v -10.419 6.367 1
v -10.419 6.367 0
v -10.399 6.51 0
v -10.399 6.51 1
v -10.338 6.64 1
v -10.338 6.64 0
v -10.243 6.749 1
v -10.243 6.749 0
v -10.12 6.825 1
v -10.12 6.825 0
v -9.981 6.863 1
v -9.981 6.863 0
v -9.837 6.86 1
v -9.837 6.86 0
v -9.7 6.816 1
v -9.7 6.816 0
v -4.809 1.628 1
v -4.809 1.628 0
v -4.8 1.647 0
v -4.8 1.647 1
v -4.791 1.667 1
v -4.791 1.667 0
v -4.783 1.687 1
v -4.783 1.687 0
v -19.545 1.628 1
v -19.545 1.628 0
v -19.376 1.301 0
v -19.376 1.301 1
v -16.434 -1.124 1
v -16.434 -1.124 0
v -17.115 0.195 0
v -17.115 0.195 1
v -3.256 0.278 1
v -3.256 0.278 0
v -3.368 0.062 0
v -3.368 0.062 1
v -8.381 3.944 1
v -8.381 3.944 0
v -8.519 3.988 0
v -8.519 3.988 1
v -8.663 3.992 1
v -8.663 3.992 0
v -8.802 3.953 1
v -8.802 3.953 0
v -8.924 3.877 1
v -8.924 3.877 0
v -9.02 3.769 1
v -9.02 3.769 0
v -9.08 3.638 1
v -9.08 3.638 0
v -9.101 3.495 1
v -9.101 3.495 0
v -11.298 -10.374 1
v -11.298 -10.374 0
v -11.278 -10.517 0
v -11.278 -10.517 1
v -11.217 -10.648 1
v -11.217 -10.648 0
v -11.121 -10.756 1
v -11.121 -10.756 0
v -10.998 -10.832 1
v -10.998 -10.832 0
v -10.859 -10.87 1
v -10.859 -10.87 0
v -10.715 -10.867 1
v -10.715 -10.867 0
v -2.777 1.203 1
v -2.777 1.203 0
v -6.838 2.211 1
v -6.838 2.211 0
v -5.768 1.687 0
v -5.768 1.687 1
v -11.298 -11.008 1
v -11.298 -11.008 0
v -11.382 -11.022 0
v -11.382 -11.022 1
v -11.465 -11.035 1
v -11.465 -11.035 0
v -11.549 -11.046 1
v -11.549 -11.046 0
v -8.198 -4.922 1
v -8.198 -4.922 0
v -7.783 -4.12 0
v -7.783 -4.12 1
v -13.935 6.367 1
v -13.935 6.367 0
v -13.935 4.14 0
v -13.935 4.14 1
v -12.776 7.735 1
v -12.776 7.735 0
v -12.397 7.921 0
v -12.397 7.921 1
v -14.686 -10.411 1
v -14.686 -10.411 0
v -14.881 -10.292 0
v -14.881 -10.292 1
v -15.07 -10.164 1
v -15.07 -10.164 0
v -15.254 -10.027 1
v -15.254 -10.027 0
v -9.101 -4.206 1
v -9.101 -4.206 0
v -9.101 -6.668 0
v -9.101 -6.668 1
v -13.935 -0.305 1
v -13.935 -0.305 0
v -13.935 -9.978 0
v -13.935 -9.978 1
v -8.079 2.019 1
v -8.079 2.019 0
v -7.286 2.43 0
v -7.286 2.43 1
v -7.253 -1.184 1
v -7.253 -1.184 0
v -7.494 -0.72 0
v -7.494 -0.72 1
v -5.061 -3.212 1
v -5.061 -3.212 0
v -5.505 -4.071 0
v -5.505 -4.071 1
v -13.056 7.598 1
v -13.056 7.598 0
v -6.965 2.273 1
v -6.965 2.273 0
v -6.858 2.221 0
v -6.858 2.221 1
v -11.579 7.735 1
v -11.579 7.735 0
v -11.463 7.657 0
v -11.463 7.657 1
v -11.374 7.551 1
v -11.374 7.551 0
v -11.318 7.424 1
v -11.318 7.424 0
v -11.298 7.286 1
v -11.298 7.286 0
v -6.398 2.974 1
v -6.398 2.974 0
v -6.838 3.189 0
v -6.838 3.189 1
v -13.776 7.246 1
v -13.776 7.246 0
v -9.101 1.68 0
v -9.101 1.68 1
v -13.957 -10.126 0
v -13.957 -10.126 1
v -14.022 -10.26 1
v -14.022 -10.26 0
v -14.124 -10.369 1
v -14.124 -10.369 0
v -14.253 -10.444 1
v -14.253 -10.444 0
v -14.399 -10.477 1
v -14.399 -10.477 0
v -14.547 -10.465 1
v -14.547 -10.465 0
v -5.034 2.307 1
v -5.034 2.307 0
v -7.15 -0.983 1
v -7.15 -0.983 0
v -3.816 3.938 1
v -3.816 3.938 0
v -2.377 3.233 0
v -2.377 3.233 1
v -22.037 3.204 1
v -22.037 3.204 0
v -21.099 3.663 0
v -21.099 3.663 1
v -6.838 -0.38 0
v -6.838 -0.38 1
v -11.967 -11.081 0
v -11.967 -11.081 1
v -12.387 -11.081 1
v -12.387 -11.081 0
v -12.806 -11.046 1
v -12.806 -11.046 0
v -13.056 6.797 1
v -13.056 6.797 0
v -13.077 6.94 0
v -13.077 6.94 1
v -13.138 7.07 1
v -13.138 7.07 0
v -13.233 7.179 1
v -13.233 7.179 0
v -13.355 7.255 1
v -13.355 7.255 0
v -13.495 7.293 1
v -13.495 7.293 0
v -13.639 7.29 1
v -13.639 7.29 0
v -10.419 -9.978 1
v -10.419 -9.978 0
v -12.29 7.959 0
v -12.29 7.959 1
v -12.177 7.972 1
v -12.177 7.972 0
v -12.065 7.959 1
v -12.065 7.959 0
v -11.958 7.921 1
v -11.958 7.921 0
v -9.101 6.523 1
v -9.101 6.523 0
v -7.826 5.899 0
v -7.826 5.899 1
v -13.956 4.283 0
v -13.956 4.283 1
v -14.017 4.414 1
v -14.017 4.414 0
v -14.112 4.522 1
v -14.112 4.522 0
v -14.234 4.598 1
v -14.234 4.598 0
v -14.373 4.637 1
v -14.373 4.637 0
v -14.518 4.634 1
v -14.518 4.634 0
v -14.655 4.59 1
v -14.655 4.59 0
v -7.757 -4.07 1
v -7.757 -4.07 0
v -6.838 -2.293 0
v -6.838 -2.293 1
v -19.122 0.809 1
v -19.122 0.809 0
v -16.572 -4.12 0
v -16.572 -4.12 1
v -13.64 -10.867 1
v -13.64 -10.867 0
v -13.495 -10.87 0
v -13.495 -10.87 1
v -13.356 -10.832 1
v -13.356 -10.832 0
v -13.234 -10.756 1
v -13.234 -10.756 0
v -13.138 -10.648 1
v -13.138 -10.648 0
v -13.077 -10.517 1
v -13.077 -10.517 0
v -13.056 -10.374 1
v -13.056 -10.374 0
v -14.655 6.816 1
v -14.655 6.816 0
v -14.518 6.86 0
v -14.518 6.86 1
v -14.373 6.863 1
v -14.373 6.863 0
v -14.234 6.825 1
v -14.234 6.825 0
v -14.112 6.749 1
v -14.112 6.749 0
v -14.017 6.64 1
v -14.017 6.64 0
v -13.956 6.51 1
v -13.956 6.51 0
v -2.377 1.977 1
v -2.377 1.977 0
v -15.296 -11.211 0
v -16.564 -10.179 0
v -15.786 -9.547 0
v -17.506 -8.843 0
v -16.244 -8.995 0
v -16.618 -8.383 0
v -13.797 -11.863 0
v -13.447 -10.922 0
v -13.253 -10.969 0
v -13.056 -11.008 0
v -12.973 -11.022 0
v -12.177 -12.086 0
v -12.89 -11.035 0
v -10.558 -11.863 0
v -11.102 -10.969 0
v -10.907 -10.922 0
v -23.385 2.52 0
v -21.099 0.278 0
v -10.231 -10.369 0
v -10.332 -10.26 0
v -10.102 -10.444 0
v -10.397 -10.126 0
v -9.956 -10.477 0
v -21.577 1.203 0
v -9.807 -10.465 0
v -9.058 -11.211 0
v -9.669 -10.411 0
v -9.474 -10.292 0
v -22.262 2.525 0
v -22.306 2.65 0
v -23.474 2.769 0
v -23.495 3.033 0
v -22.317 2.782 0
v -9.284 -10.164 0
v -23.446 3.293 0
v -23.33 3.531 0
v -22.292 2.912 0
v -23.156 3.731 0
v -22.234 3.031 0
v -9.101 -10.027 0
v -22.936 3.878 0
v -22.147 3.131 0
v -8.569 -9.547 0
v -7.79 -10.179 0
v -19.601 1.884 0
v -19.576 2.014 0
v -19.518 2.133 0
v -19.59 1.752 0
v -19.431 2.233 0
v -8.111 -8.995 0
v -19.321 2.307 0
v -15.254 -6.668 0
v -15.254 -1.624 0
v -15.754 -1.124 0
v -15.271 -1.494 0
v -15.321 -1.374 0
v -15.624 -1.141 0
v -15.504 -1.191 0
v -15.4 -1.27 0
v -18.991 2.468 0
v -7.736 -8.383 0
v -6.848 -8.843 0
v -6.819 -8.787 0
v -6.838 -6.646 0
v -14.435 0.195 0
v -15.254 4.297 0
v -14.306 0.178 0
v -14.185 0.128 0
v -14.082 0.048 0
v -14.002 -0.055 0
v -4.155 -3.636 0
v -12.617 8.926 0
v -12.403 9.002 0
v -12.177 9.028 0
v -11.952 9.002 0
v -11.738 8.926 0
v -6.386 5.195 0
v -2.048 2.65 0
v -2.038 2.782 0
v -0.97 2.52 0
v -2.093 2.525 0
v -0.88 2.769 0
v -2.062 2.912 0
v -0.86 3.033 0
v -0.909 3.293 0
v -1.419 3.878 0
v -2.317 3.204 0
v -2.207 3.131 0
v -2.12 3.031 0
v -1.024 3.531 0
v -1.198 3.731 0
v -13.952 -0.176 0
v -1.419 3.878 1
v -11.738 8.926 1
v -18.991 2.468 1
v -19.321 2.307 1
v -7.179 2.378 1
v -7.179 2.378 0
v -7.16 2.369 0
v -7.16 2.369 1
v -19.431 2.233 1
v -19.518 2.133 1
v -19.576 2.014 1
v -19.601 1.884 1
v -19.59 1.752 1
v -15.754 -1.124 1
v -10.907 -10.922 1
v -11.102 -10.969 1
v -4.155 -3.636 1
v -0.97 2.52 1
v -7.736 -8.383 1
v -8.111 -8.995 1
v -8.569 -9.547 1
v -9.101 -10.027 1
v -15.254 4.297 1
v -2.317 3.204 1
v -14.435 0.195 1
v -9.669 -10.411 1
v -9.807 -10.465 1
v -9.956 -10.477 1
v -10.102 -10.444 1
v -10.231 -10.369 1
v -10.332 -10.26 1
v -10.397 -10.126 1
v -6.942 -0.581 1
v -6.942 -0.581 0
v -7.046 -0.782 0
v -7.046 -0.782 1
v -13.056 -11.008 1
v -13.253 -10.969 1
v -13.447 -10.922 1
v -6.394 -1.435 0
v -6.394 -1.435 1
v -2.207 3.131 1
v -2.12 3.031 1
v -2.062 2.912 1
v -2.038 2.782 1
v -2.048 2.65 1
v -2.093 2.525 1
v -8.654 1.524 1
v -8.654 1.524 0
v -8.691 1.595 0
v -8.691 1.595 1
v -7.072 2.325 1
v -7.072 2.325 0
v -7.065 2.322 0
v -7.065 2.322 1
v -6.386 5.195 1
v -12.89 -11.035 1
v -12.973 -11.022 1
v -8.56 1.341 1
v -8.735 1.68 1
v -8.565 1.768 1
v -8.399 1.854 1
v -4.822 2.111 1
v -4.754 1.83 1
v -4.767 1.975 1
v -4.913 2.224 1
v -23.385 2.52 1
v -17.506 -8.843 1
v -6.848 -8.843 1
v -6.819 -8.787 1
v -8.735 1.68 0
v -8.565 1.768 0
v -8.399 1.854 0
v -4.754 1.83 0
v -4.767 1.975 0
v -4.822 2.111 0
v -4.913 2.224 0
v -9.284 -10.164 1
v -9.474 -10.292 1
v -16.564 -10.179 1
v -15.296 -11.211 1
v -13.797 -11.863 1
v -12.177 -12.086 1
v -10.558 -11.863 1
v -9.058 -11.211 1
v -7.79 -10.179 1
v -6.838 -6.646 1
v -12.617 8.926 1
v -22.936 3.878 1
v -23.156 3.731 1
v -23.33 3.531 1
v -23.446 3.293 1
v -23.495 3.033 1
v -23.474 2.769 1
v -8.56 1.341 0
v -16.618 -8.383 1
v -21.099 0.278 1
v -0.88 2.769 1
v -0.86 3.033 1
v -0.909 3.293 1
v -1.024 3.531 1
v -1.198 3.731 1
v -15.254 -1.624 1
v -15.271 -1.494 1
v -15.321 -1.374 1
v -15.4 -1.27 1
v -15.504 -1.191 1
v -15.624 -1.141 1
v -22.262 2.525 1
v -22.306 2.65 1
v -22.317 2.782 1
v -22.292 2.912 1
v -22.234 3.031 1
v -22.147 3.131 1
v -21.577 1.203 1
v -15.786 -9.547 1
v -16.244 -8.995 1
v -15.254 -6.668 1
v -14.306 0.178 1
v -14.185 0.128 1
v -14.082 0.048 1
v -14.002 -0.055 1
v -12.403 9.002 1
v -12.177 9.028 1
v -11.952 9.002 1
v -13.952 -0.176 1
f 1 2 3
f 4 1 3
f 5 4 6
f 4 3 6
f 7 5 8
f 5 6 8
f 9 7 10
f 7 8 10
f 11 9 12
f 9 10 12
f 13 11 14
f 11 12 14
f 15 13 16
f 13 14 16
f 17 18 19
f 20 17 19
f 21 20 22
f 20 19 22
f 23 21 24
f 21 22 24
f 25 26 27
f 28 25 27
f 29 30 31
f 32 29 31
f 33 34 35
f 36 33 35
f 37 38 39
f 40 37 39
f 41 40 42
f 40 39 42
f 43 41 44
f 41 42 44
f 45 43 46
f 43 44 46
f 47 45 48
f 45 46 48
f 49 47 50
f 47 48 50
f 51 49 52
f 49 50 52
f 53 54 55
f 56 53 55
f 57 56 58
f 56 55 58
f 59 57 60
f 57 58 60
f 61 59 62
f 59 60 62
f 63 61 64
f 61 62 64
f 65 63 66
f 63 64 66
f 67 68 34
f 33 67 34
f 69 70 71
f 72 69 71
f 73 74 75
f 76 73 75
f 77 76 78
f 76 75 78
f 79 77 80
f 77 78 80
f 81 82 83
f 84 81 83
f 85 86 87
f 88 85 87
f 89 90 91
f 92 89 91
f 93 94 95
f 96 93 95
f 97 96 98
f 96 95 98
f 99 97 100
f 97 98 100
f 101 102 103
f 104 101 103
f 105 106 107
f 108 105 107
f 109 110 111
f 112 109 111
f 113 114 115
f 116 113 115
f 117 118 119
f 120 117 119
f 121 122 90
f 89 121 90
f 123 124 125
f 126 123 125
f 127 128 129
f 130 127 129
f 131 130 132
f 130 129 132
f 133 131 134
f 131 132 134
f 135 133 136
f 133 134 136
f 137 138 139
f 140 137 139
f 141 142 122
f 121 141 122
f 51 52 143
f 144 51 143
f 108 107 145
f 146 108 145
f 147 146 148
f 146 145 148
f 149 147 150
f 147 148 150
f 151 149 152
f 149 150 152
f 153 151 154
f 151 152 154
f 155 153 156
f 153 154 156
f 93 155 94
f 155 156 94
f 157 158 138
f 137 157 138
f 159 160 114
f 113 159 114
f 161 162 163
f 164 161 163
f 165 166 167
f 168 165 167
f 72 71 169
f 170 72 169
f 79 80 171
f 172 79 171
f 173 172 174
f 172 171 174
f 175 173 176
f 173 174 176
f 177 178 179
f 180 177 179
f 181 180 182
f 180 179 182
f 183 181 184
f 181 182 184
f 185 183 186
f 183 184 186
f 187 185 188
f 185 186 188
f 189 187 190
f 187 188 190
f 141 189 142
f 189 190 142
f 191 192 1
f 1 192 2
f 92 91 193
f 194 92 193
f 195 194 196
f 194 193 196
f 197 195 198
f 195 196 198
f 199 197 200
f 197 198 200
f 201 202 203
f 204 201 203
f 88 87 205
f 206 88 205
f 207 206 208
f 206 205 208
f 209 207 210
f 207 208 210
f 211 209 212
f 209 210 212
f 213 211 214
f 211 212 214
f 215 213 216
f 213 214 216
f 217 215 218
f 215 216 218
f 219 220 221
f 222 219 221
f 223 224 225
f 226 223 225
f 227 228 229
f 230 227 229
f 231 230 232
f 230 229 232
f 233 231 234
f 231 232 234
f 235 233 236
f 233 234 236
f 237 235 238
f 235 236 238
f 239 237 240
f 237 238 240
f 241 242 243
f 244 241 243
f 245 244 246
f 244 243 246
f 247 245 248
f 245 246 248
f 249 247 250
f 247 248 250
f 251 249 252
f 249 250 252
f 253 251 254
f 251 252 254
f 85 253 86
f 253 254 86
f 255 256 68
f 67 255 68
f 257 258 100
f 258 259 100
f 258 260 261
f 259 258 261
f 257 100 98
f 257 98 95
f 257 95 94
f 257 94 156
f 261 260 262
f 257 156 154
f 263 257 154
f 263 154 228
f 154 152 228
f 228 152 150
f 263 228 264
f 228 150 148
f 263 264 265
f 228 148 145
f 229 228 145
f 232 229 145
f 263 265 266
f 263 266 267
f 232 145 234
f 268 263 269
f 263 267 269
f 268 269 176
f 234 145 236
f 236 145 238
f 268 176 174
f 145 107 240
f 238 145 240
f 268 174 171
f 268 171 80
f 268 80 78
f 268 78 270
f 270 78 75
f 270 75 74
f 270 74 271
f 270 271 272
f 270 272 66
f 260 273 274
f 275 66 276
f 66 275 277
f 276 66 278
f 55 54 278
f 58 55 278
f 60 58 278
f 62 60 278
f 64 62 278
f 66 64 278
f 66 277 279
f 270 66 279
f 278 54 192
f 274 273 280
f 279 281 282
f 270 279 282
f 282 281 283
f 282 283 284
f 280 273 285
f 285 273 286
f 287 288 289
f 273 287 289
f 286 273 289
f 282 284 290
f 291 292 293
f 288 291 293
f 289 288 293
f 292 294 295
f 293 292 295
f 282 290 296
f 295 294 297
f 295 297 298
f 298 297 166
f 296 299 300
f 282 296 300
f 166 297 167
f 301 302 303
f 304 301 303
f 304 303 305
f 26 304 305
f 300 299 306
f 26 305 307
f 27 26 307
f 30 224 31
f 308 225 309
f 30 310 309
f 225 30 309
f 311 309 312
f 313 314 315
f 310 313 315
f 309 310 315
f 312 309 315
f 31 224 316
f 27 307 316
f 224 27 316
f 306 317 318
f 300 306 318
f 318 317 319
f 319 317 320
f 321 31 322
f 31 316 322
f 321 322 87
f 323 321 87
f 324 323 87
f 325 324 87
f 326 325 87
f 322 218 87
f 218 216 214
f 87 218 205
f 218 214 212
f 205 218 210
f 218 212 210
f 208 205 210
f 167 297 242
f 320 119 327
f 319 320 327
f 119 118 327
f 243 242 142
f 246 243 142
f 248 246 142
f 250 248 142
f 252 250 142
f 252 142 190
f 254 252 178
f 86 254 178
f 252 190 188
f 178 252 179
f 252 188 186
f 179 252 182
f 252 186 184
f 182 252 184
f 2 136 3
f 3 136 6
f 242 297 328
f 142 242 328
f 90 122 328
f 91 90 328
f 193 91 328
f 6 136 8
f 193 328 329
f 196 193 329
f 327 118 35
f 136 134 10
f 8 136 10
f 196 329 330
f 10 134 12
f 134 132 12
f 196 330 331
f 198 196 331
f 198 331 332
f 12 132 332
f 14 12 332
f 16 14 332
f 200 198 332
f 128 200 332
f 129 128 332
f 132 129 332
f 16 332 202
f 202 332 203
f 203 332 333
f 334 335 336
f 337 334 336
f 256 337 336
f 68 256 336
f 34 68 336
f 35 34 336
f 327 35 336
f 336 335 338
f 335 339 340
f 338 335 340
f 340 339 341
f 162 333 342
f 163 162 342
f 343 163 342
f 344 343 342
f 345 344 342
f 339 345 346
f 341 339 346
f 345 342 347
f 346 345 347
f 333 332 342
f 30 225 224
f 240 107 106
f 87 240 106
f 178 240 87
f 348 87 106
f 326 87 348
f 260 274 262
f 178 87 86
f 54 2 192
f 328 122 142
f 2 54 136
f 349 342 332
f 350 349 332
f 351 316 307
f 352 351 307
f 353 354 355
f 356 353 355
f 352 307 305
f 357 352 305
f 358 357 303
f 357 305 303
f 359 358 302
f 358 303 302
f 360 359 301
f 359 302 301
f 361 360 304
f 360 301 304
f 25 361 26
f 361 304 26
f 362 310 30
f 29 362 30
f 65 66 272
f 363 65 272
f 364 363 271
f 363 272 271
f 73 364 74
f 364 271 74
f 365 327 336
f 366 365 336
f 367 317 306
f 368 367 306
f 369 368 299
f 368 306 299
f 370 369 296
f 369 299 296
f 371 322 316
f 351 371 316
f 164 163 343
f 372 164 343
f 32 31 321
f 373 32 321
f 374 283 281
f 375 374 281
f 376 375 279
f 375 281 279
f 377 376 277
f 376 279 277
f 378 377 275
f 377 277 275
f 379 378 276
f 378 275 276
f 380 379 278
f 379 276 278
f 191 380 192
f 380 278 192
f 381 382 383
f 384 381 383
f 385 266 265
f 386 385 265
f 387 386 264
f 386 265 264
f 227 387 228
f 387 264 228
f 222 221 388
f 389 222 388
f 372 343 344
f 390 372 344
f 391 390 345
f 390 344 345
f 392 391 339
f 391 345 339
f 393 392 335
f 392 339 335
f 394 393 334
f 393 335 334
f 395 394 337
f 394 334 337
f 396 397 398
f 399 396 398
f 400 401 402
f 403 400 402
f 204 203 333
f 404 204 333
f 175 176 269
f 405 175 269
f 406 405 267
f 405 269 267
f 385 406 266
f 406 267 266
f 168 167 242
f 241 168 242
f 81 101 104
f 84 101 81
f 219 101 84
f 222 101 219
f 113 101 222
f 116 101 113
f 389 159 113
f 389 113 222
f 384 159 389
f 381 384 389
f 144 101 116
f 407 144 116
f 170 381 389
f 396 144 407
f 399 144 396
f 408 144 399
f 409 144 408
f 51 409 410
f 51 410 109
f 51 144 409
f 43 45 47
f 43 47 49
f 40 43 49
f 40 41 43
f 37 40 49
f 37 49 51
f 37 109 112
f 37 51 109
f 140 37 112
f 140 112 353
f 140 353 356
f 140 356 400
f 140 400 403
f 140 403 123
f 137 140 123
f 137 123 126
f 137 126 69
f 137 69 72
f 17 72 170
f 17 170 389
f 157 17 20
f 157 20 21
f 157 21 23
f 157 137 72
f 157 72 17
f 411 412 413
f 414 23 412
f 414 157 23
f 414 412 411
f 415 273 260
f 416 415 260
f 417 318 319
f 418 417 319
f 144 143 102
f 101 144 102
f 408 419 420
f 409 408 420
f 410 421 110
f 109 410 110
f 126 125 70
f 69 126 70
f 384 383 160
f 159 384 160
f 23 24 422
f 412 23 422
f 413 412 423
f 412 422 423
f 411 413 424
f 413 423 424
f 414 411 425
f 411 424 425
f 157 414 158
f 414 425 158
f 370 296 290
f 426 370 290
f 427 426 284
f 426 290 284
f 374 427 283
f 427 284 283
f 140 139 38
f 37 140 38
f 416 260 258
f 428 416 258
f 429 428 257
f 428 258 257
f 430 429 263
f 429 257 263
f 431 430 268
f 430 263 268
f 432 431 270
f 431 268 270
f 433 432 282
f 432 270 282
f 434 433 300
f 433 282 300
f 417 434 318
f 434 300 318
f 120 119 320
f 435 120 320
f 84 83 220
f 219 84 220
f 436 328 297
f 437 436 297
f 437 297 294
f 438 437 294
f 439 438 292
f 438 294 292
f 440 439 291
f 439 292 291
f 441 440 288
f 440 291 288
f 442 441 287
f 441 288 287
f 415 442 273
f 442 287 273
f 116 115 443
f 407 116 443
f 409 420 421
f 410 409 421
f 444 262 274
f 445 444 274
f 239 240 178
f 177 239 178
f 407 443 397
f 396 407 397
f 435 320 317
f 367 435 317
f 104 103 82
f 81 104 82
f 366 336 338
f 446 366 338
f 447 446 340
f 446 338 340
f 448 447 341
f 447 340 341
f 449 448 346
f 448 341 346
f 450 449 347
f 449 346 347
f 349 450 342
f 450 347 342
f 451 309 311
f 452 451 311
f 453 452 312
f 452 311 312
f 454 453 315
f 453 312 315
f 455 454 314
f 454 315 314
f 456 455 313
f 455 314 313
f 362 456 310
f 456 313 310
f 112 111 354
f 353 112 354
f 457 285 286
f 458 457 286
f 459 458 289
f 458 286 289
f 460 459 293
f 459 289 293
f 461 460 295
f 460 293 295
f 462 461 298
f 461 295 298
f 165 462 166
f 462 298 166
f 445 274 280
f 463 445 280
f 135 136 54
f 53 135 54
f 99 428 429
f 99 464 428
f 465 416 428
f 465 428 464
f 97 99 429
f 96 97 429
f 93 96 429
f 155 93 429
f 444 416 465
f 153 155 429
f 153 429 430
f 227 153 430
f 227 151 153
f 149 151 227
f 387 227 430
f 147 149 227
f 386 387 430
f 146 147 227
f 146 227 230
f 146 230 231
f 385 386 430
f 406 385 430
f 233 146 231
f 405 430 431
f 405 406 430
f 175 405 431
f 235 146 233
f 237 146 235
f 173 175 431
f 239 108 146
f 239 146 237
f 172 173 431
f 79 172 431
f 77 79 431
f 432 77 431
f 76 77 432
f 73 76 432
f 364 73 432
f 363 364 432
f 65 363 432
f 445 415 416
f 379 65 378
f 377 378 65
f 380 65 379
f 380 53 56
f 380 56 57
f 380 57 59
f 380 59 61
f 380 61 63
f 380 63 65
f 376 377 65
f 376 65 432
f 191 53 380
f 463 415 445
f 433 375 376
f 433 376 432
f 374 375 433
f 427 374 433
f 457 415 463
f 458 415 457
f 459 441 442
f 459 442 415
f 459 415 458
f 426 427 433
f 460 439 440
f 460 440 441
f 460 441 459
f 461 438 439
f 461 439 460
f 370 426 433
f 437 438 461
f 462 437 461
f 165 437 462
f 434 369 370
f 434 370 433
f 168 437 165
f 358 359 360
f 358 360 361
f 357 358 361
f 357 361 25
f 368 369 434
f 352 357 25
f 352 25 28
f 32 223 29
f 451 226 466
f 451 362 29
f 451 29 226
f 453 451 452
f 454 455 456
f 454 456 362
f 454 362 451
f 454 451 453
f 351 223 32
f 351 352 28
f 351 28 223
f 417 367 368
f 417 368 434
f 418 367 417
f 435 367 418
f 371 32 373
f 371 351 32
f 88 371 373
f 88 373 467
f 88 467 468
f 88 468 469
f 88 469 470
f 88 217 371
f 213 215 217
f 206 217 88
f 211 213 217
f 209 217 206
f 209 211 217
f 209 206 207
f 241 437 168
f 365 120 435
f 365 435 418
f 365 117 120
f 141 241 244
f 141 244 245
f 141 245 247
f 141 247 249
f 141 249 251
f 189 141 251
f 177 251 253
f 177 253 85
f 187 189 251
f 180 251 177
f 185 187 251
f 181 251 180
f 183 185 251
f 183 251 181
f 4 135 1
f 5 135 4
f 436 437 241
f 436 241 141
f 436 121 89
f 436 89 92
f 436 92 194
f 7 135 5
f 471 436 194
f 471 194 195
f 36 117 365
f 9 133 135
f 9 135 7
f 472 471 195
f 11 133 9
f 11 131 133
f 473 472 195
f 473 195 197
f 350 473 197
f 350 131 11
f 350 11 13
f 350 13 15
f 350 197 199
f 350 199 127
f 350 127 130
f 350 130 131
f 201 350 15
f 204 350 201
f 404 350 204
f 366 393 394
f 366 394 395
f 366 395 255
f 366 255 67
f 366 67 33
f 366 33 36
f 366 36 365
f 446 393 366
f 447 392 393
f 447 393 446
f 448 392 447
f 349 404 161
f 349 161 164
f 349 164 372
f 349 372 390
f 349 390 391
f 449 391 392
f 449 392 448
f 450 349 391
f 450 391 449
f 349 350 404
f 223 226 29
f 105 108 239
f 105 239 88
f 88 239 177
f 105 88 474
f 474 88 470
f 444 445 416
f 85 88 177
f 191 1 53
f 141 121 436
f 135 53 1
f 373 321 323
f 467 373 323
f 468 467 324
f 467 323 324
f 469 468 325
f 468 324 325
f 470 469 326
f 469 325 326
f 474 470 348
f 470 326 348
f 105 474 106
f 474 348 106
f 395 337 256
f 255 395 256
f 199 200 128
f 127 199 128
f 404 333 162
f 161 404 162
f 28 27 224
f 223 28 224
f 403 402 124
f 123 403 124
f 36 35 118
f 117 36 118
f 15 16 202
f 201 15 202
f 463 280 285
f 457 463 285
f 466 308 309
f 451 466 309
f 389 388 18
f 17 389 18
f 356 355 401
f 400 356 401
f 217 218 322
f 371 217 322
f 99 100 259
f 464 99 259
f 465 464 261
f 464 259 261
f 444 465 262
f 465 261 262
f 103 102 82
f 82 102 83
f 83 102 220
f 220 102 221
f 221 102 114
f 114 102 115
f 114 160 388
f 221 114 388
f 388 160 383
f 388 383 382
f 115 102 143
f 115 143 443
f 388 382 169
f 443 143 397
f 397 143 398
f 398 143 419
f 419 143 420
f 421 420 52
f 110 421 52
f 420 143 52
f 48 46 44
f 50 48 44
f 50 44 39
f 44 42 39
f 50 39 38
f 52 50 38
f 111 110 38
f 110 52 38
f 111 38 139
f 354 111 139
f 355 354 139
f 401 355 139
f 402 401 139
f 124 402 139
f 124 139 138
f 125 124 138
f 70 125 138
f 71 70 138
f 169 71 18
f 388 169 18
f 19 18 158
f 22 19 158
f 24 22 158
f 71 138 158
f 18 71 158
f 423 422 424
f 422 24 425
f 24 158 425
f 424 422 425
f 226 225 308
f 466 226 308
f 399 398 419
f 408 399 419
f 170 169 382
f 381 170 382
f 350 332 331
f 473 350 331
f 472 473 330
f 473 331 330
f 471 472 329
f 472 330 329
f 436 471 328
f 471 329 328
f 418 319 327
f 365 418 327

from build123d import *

# Parameters (mm, degrees)
F1_DEPTH = 1


# Not quite as in the source:
# - ends of sketch curves that miss each other by under 0.0002 mm in the source are joined
# - a feature names something its author has since deleted; it is built from what else it names


with BuildPart() as f1:
    # F0 (on Top) → F1 (new body)
    with BuildSketch(Plane.XY):
        with BuildLine():
            ThreePointArc((-11.7378467649, 8.9264858588), (-12.17732, 9.0282301738), (-12.6167932351, 8.9264858588))
            Line((-12.6167932351, 8.9264858588), (-22.9360292278, 3.8777807945))
            ThreePointArc((-22.9360292278, 3.8777807945), (-23.4460487393, 3.2933140895), (-23.3847383062, 2.5200338931))
            Line((-23.3847383062, 2.5200338931), (-17.5064138811, -8.8425854586))
            ThreePointArc((-17.5064138811, -8.8425854586), (-12.17732, -12.0856381601), (-6.8482261189, -8.8425854586))
            Line((-6.8482261189, -8.8425854586), (-6.8193229677, -8.786716561))
            Line((-6.8193229677, -8.786716561), (-4.1547760271, -3.6362297146))
            Line((-4.1547760271, -3.6362297146), (-0.9699016938, 2.5200338931))
            ThreePointArc((-0.9699016938, 2.5200338931), (-0.9085912607, 3.2933140895), (-1.4186107722, 3.8777807945))
            Line((-1.4186107722, 3.8777807945), (-11.7378467649, 8.9264858588))
        make_face()
        with BuildLine():
            ThreePointArc((-13.9352129405, -9.9781848161), (-14.1856518225, -10.4114506102), (-14.6860899339, -10.4106900001))
            ThreePointArc((-14.6860899339, -10.4106900001), (-14.9764347702, -10.2286994079), (-15.253632646, -10.0272495698))
            ThreePointArc((-15.253632646, -10.0272495698), (-16.0247836651, -9.2789159973), (-16.6182315676, -8.3830942422))
            Line((-16.6182315676, -8.3830942422), (-21.0987998739, 0.2777057515))
            Line((-21.0987998739, 0.2777057515), (-21.5773427489, 1.202714332))
            Line((-21.5773427489, 1.202714332), (-22.2616031934, 2.5253686134))
            ThreePointArc((-22.2616031934, 2.5253686134), (-22.29225841, 2.9120087116), (-22.0372486542, 3.2042420641))
            Line((-22.0372486542, 3.2042420641), (-21.0987998739, 3.6633798445))
            Line((-21.0987998739, 3.6633798445), (-14.6549495581, 6.8160453855))
            ThreePointArc((-14.6549495581, 6.8160453855), (-14.1705134022, 6.7911040048), (-13.9352129405, 6.366917543))
            Line((-13.9352129405, 6.366917543), (-13.9352129405, 4.1403800065))
            ThreePointArc((-13.9352129405, 4.1403800065), (-14.1705134022, 4.5645664683), (-14.6549495581, 4.589507849))
            Line((-14.6549495581, 4.589507849), (-15.253632646, 4.2966010544))
            Line((-15.253632646, 4.2966010544), (-18.9906600384, 2.4682535744))
            Line((-18.9906600384, 2.4682535744), (-18.5866887981, 1.687389658))
            Line((-18.5866887981, 1.687389658), (-16.9010777379, 2.5120779491))
            Line((-16.9010777379, 2.5120779491), (-14.6549495581, 3.6110002651))
            ThreePointArc((-14.6549495581, 3.6110002651), (-14.1705134022, 3.5860588844), (-13.9352129405, 3.1618724226))
            Line((-13.9352129405, 3.1618724226), (-13.9352129405, 1.0737917123))
            Line((-13.9352129405, 1.0737917123), (-13.9352129405, -0.3051582877))
            Line((-13.9352129405, -0.3051582877), (-13.9352129405, -9.9781848161))
        make_face(mode=Mode.SUBTRACT)
        with BuildLine():
            Line((-10.6659804544, -10.8341303593), (-10.4194270595, -10.7664300173))
            ThreePointArc((-10.4194270595, -10.7664300173), (-10.5663720437, -10.8190139832), (-10.7148866003, -10.8669861449))
            ThreePointArc((-10.7148866003, -10.8669861449), (-11.0045154737, -10.9461452883), (-11.2983735297, -11.0077772381))
            ThreePointArc((-11.2983735297, -11.0077772381), (-11.423285282, -11.0284543254), (-11.548680536, -11.0459619827))
            ThreePointArc((-11.548680536, -11.0459619827), (-11.6318465406, -11.0842260567), (-11.720595012, -11.1066856319))
            ThreePointArc((-11.720595012, -11.1066856319), (-12.17732, -11.1424265632), (-12.634044988, -11.1066856319))
            ThreePointArc((-12.634044988, -11.1066856319), (-12.7227934594, -11.0842260567), (-12.805959464, -11.0459619827))
            ThreePointArc((-12.805959464, -11.0459619827), (-12.931354718, -11.0284543254), (-13.0562664703, -11.0077772381))
            ThreePointArc((-13.0562664703, -11.0077772381), (-13.3501245263, -10.9461452883), (-13.6397533997, -10.8669861449))
            ThreePointArc((-13.6397533997, -10.8669861449), (-13.2335773511, -10.7559370641), (-13.0562664703, -10.3740054834))
            Line((-13.0562664703, -10.3740054834), (-13.0562664703, -10.0437429667))
            Line((-13.0562664703, -10.0437429667), (-13.0562664703, 5.3716664708))
            Line((-13.0562664703, 5.3716664708), (-13.0562664703, 6.7969437096))
            ThreePointArc((-13.0562664703, 6.7969437096), (-13.2915669319, 7.2211301714), (-13.7760030878, 7.246071552))
            Line((-13.7760030878, 7.246071552), (-13.0562664703, 7.5982040073))
            Line((-13.0562664703, 7.5982040073), (-12.7760030878, 7.7353233792))
            Line((-12.7760030878, 7.7353233792), (-12.3970566176, 7.9207236322))
            ThreePointArc((-12.3970566176, 7.9207236322), (-12.17732, 7.9715957897), (-11.9575833824, 7.9207236322))
            Line((-11.9575833824, 7.9207236322), (-11.5786369122, 7.7353233792))
            ThreePointArc((-11.5786369122, 7.7353233792), (-11.3741870679, 7.5508950751), (-11.2983735297, 7.2861955367))
            Line((-11.2983735297, 7.2861955367), (-11.2983735297, -10.0437429667))
            Line((-11.2983735297, -10.0437429667), (-11.2983735297, -10.3519767804))
            ThreePointArc((-11.2983735297, -10.3519767804), (-11.1015265128, -10.7495925105), (-10.6659804544, -10.8341303593))
        make_face(mode=Mode.SUBTRACT)
        with BuildLine():
            Line((-5.5053601225, -4.0705468447), (-6.0704119356, -5.1627745276))
            Line((-6.0704119356, -5.1627745276), (-6.8376335928, -6.6457902679))
            Line((-6.8376335928, -6.6457902679), (-7.7364084324, -8.3830942422))
            ThreePointArc((-7.7364084324, -8.3830942422), (-8.3298563349, -9.2789159973), (-9.101007354, -10.0272495698))
            ThreePointArc((-9.101007354, -10.0272495698), (-9.3782052298, -10.2286994079), (-9.6685500661, -10.4106900001))
            ThreePointArc((-9.6685500661, -10.4106900001), (-10.1689881775, -10.4114506102), (-10.4194270595, -9.9781848161))
            Line((-10.4194270595, -9.9781848161), (-10.4194270595, -1.8278266693))
            Line((-10.4194270595, -1.8278266693), (-10.4194270595, -0.3051582877))
            Line((-10.4194270595, -0.3051582877), (-10.4194270595, 0.2777057515))
            Line((-10.4194270595, 0.2777057515), (-10.4194270595, 0.5210568374))
            Line((-10.4194270595, 0.5210568374), (-10.4194270595, 3.0275448634))
            Line((-10.4194270595, 3.0275448634), (-10.4194270595, 4.6300693884))
            Line((-10.4194270595, 4.6300693884), (-10.4194270595, 6.366917543))
            Line((-10.4194270595, 6.366917543), (-10.4194270595, 7.1681778407))
            Line((-10.4194270595, 7.1681778407), (-9.6996904419, 6.8160453855))
            Line((-9.6996904419, 6.8160453855), (-9.101007354, 6.5231385909))
            Line((-9.101007354, 6.5231385909), (-7.825559943, 5.8991236145))
            Line((-7.825559943, 5.8991236145), (-6.386082692, 5.1948567393))
            Line((-6.386082692, 5.1948567393), (-3.816366891, 3.9376185884))
            Line((-3.816366891, 3.9376185884), (-2.3768901261, 3.2333519511))
            Line((-2.3768901261, 3.2333519511), (-2.3173913458, 3.2042420641))
            ThreePointArc((-2.3173913458, 3.2042420641), (-2.06238159, 2.9120087116), (-2.0930368066, 2.5253686134))
            Line((-2.0930368066, 2.5253686134), (-2.3768901261, 1.9766889238))
            Line((-2.3768901261, 1.9766889238), (-2.7772972511, 1.202714332))
            Line((-2.7772972511, 1.202714332), (-3.2558401261, 0.2777057515))
            Line((-3.2558401261, 0.2777057515), (-3.3676578126, 0.061565621))
            Line((-3.3676578126, 0.061565621), (-5.0612689658, -3.2121323703))
            Line((-5.0612689658, -3.2121323703), (-5.5053601225, -4.0705468447))
        make_face(mode=Mode.SUBTRACT)
        with BuildLine():
            Line((-16.5720523514, -4.1197169088), (-15.2536327446, -6.6681812422))
            Line((-15.2536327446, -6.6681812422), (-15.2536328928, -1.623578273))
            ThreePointArc((-15.2536328928, -1.623578273), (-15.4000795074, -1.2700248919), (-15.7536328928, -1.1235782877))
            Line((-15.7536328928, -1.1235782877), (-16.0720525039, -1.1235782877))
            Line((-16.0720525039, -1.1235782877), (-16.4336040792, -1.1235782877))
            Line((-16.4336040792, -1.1235782877), (-17.1154396337, 0.1948417123))
            Line((-17.1154396337, 0.1948417123), (-16.0720524345, 0.1948417123))
            Line((-16.0720524345, 0.1948417123), (-15.2536329075, 0.1948417123))
            Line((-15.2536329075, 0.1948417123), (-14.4352129405, 0.1948417123))
            ThreePointArc((-14.4352129405, 0.1948417123), (-14.08165955, 0.0483951029), (-13.9352129405, -0.3051582877))
            Line((-13.9352129405, -0.3051582877), (-13.9352129405, 1.0737917123))
            Line((-13.9352129405, 1.0737917123), (-15.2536329075, 1.0737917123))
            Line((-15.2536329075, 1.0737917123), (-18.2692507427, 1.0737917123))
            Line((-18.2692507427, 1.0737917123), (-18.6097401643, 1.0737917123))
            Line((-18.6097401643, 1.0737917123), (-19.1218068604, 0.8088797168))
            Line((-19.1218068604, 0.8088797168), (-16.5720523514, -4.1197169088))
        make_face()
        Polygon((-16.1325828631, -3.0563212317), (-16.6777508926, -2.0025282877), (-16.1325828631, -2.0025282877), (-16.1325828631, -2.6348403451), align=None, mode=Mode.SUBTRACT)
        with BuildLine():
            Line((-15.2536329075, 1.0737917123), (-13.9352129405, 1.0737917123))
            Line((-13.9352129405, 1.0737917123), (-13.9352129405, 3.1618724226))
            ThreePointArc((-13.9352129405, 3.1618724226), (-14.1705134022, 3.5860588844), (-14.6549495581, 3.6110002651))
            Line((-14.6549495581, 3.6110002651), (-16.9010777379, 2.5120779491))
            Line((-16.9010777379, 2.5120779491), (-18.5866887981, 1.687389658))
            Line((-18.5866887981, 1.687389658), (-18.3411390159, 1.2127495215))
            Line((-18.3411390159, 1.2127495215), (-18.2692507427, 1.0737917123))
            Line((-18.2692507427, 1.0737917123), (-15.2536329075, 1.0737917123))
        make_face()
        with BuildLine():
            Line((-19.5454273692, 1.6277250617), (-19.3764089282, 1.3010176414))
            Line((-19.3764089282, 1.3010176414), (-18.5866887981, 1.687389658))
            Line((-18.5866887981, 1.687389658), (-18.9906600384, 2.4682535744))
            Line((-18.9906600384, 2.4682535744), (-19.32107283, 2.3065985124))
            ThreePointArc((-19.32107283, 2.3065985124), (-19.5760825858, 2.01436516), (-19.5454273692, 1.6277250617))
        make_face()
        Polygon((-19.3764089282, 1.3010176414), (-19.1218068604, 0.8088797168), (-18.6097401643, 1.0737917123), (-18.3411390159, 1.2127495215), (-18.5866887981, 1.687389658), align=None)
        Polygon((-16.1325828631, -2.0025282877), (-16.6777508926, -2.0025282877), (-16.1325828631, -3.0563212317), (-16.1325828631, -2.6348403451), align=None)
        with BuildLine():
            Line((-10.4194270595, 7.1681778407), (-10.4194270595, 6.366917543))
            ThreePointArc((-10.4194270595, 6.366917543), (-10.1841265978, 6.7911040048), (-9.6996904419, 6.8160453855))
            Line((-9.6996904419, 6.8160453855), (-10.4194270595, 7.1681778407))
        make_face()
        with BuildLine():
            ThreePointArc((-11.720595012, -11.1066856319), (-11.6318465406, -11.0842260567), (-11.548680536, -11.0459619827))
            ThreePointArc((-11.548680536, -11.0459619827), (-12.17732, -11.0856381601), (-12.805959464, -11.0459619827))
            ThreePointArc((-12.805959464, -11.0459619827), (-12.7227934594, -11.0842260567), (-12.634044988, -11.1066856319))
            ThreePointArc((-12.634044988, -11.1066856319), (-12.17732, -11.1424265632), (-11.720595012, -11.1066856319))
        make_face()
        Polygon((-18.3411390159, 1.2127495215), (-18.6097401643, 1.0737917123), (-18.2692507427, 1.0737917123), align=None)
        with BuildLine():
            ThreePointArc((-10.7148866003, -10.8669861449), (-10.5663720437, -10.8190139832), (-10.4194270595, -10.7664300173))
            Line((-10.4194270595, -10.7664300173), (-10.6659804544, -10.8341303593))
            ThreePointArc((-10.6659804544, -10.8341303593), (-11.1015265128, -10.7495925105), (-11.2983735297, -10.3519767804))
            Line((-11.2983735297, -10.3519767804), (-11.2983735297, -10.3740054834))
            ThreePointArc((-11.2983735297, -10.3740054834), (-11.1210626489, -10.7559370641), (-10.7148866003, -10.8669861449))
        make_face()
    extrude(amount=F1_DEPTH)


with BuildPart() as f1b:
    # F0 (on Top) → F1, piece 2 (new body)
    with BuildSketch(Plane.XY):
        with BuildLine():
            Line((-9.1010072554, -6.6681812422), (-8.1977966169, -4.9223030059))
            ThreePointArc((-8.1977966169, -4.9223030059), (-8.6841611224, -4.6077302475), (-9.1010072685, -4.2055539889))
            Line((-9.1010072685, -4.2055539889), (-9.1010072554, -6.6681812422))
        make_face()
        with BuildLine():
            ThreePointArc((-9.1010072685, -4.2055539889), (-8.6841611224, -4.6077302475), (-8.1977966169, -4.9223030059))
            Line((-8.1977966169, -4.9223030059), (-7.7825876486, -4.1197169088))
            Line((-7.7825876486, -4.1197169088), (-7.7566160256, -4.0695145646))
            ThreePointArc((-7.7566160256, -4.0695145646), (-8.2518471552, -3.7073634999), (-8.6139982198, -3.2121323703))
            Line((-8.6139982198, -3.2121323703), (-9.101007354, -2.2707587726))
            Line((-9.101007354, -2.2707587726), (-9.101007354, -4.2055539889))
        make_face()
        with BuildLine():
            Line((-9.101007354, -1.623578273), (-9.101007354, -2.2707587726))
            Line((-9.101007354, -2.2707587726), (-8.6139982198, -3.2121323703))
            ThreePointArc((-8.6139982198, -3.2121323703), (-8.2518471552, -3.7073634999), (-7.7566160256, -4.0695145646))
            Line((-7.7566160256, -4.0695145646), (-6.8376335928, -2.2931499375))
            Line((-6.8376335928, -2.2931499375), (-6.393542436, -1.4347354631))
            ThreePointArc((-6.393542436, -1.4347354631), (-6.8376335928, -1.7049898549), (-7.2817247495, -1.4347354631))
            Line((-7.2817247495, -1.4347354631), (-8.8660545548, 1.6277250617))
            ThreePointArc((-8.8660545548, 1.6277250617), (-8.8784767188, 1.6535207057), (-8.8894020206, 1.6799850815))
            Line((-8.8894020206, 1.6799850815), (-9.101007354, 1.6799850815))
            Line((-9.101007354, 1.6799850815), (-9.101007354, -1.623578273))
        make_face()
        with BuildLine():
            Line((-9.101007354, 3.4953407566), (-9.101007354, 1.6799850815))
            Line((-9.101007354, 1.6799850815), (-8.8894020206, 1.6799850815))
            ThreePointArc((-8.8894020206, 1.6799850815), (-8.8869510867, 2.0412815765), (-8.6417000156, 2.3065985124))
            Line((-8.6417000156, 2.3065985124), (-7.2771068279, 2.9742282228))
            ThreePointArc((-7.2771068279, 2.9742282228), (-7.063182163, 3.0502044622), (-6.8376335928, 3.0759725378))
            Line((-6.8376335928, 3.0759725378), (-6.8376335928, 3.1892413061))
            Line((-6.8376335928, 3.1892413061), (-8.3812707365, 3.9444685991))
            ThreePointArc((-8.3812707365, 3.9444685991), (-8.8657068924, 3.9195272185), (-9.101007354, 3.4953407566))
        make_face()
        with BuildLine():
            ThreePointArc((-7.2817247495, -1.4347354631), (-6.8376335928, -1.7049898549), (-6.393542436, -1.4347354631))
            Line((-6.393542436, -1.4347354631), (-4.8092126308, 1.6277250617))
            ThreePointArc((-4.8092126308, 1.6277250617), (-4.7951941207, 1.6571321237), (-4.7831203666, 1.687389658))
            Line((-4.7831203666, 1.687389658), (-5.7679512019, 1.687389658))
            Line((-5.7679512019, 1.687389658), (-6.8376335928, -0.3802733283))
            Line((-6.8376335928, -0.3802733283), (-6.9415896155, -0.5812171058))
            Line((-6.9415896155, -0.5812171058), (-7.0455456382, -0.7821608834))
            Line((-7.0455456382, -0.7821608834), (-7.0456700866, -0.7824014383))
            Line((-7.0456700866, -0.7824014383), (-7.1495016609, -0.9831046609))
            Line((-7.1495016609, -0.9831046609), (-7.2534576837, -1.1840484384))
            Line((-7.2534576837, -1.1840484384), (-7.4936940826, -0.7196789075))
            Line((-7.4936940826, -0.7196789075), (-8.5595457985, 1.3405795023))
            Line((-8.5595457985, 1.3405795023), (-8.6542783092, 1.5236945164))
            Line((-8.6542783092, 1.5236945164), (-8.6912365674, 1.5951336867))
            Line((-8.6912365674, 1.5951336867), (-8.7351334904, 1.6799850815))
            Line((-8.7351334904, 1.6799850815), (-8.8894020206, 1.6799850815))
            ThreePointArc((-8.8894020206, 1.6799850815), (-8.8784767188, 1.6535207057), (-8.8660545548, 1.6277250617))
            Line((-8.8660545548, 1.6277250617), (-7.2817247495, -1.4347354631))
        make_face()
        with BuildLine():
            ThreePointArc((-8.6417000156, 2.3065985124), (-8.8869510867, 2.0412815765), (-8.8894020206, 1.6799850815))
            Line((-8.8894020206, 1.6799850815), (-8.7351334904, 1.6799850815))
            Line((-8.7351334904, 1.6799850815), (-8.5654128233, 1.7677881761))
            Line((-8.5654128233, 1.7677881761), (-8.3994958527, 1.8536234709))
            Line((-8.3994958527, 1.8536234709), (-8.0790730005, 2.0193906606))
            Line((-8.0790730005, 2.0193906606), (-7.285583076, 2.4298938254))
            Line((-7.285583076, 2.4298938254), (-7.1787263557, 2.3776139797))
            Line((-7.1787263557, 2.3776139797), (-6.8376335928, 2.5540745174))
            Line((-6.8376335928, 2.5540745174), (-6.8376335928, 3.0759725378))
            ThreePointArc((-6.8376335928, 3.0759725378), (-7.063182163, 3.0502044622), (-7.2771068279, 2.9742282228))
            Line((-7.2771068279, 2.9742282228), (-8.6417000156, 2.3065985124))
        make_face()
        with BuildLine():
            Line((-5.7679512019, 1.687389658), (-4.7831203666, 1.687389658))
            ThreePointArc((-4.7831203666, 1.687389658), (-4.7897821416, 2.0449478252), (-5.03356717, 2.3065985124))
            Line((-5.03356717, 2.3065985124), (-6.3981603577, 2.9742282228))
            ThreePointArc((-6.3981603577, 2.9742282228), (-6.6120850226, 3.0502044622), (-6.8376335928, 3.0759725378))
            Line((-6.8376335928, 3.0759725378), (-6.8376335928, 2.5540745174))
            Line((-6.8376335928, 2.5540745174), (-6.8376335928, 2.3389525605))
            Line((-6.8376335928, 2.3389525605), (-6.8376335928, 2.2107337222))
            Line((-6.8376335928, 2.2107337222), (-5.7679512019, 1.687389658))
        make_face()
        with BuildLine():
            Line((-6.3981603577, 2.9742282228), (-6.8376335928, 3.1892413061))
            Line((-6.8376335928, 3.1892413061), (-6.8376335928, 3.0759725378))
            ThreePointArc((-6.8376335928, 3.0759725378), (-6.6120850226, 3.0502044622), (-6.3981603577, 2.9742282228))
        make_face()
        Polygon((-6.8581561948, 2.2207744428), (-6.8376335928, 2.2107337222), (-6.8376335928, 2.3389525605), (-6.9650129151, 2.2730542884), align=None)
        Polygon((-6.8376335928, 2.3389525605), (-6.8376335928, 2.5540745174), (-7.1787263557, 2.3776139797), (-7.1601386162, 2.3685198942), (-7.0718696354, 2.3253341341), (-7.0648745265, 2.3219117643), (-6.9650129151, 2.2730542884), align=None)
    extrude(amount=F1_DEPTH)


solid = Compound([f1.part, f1b.part])
